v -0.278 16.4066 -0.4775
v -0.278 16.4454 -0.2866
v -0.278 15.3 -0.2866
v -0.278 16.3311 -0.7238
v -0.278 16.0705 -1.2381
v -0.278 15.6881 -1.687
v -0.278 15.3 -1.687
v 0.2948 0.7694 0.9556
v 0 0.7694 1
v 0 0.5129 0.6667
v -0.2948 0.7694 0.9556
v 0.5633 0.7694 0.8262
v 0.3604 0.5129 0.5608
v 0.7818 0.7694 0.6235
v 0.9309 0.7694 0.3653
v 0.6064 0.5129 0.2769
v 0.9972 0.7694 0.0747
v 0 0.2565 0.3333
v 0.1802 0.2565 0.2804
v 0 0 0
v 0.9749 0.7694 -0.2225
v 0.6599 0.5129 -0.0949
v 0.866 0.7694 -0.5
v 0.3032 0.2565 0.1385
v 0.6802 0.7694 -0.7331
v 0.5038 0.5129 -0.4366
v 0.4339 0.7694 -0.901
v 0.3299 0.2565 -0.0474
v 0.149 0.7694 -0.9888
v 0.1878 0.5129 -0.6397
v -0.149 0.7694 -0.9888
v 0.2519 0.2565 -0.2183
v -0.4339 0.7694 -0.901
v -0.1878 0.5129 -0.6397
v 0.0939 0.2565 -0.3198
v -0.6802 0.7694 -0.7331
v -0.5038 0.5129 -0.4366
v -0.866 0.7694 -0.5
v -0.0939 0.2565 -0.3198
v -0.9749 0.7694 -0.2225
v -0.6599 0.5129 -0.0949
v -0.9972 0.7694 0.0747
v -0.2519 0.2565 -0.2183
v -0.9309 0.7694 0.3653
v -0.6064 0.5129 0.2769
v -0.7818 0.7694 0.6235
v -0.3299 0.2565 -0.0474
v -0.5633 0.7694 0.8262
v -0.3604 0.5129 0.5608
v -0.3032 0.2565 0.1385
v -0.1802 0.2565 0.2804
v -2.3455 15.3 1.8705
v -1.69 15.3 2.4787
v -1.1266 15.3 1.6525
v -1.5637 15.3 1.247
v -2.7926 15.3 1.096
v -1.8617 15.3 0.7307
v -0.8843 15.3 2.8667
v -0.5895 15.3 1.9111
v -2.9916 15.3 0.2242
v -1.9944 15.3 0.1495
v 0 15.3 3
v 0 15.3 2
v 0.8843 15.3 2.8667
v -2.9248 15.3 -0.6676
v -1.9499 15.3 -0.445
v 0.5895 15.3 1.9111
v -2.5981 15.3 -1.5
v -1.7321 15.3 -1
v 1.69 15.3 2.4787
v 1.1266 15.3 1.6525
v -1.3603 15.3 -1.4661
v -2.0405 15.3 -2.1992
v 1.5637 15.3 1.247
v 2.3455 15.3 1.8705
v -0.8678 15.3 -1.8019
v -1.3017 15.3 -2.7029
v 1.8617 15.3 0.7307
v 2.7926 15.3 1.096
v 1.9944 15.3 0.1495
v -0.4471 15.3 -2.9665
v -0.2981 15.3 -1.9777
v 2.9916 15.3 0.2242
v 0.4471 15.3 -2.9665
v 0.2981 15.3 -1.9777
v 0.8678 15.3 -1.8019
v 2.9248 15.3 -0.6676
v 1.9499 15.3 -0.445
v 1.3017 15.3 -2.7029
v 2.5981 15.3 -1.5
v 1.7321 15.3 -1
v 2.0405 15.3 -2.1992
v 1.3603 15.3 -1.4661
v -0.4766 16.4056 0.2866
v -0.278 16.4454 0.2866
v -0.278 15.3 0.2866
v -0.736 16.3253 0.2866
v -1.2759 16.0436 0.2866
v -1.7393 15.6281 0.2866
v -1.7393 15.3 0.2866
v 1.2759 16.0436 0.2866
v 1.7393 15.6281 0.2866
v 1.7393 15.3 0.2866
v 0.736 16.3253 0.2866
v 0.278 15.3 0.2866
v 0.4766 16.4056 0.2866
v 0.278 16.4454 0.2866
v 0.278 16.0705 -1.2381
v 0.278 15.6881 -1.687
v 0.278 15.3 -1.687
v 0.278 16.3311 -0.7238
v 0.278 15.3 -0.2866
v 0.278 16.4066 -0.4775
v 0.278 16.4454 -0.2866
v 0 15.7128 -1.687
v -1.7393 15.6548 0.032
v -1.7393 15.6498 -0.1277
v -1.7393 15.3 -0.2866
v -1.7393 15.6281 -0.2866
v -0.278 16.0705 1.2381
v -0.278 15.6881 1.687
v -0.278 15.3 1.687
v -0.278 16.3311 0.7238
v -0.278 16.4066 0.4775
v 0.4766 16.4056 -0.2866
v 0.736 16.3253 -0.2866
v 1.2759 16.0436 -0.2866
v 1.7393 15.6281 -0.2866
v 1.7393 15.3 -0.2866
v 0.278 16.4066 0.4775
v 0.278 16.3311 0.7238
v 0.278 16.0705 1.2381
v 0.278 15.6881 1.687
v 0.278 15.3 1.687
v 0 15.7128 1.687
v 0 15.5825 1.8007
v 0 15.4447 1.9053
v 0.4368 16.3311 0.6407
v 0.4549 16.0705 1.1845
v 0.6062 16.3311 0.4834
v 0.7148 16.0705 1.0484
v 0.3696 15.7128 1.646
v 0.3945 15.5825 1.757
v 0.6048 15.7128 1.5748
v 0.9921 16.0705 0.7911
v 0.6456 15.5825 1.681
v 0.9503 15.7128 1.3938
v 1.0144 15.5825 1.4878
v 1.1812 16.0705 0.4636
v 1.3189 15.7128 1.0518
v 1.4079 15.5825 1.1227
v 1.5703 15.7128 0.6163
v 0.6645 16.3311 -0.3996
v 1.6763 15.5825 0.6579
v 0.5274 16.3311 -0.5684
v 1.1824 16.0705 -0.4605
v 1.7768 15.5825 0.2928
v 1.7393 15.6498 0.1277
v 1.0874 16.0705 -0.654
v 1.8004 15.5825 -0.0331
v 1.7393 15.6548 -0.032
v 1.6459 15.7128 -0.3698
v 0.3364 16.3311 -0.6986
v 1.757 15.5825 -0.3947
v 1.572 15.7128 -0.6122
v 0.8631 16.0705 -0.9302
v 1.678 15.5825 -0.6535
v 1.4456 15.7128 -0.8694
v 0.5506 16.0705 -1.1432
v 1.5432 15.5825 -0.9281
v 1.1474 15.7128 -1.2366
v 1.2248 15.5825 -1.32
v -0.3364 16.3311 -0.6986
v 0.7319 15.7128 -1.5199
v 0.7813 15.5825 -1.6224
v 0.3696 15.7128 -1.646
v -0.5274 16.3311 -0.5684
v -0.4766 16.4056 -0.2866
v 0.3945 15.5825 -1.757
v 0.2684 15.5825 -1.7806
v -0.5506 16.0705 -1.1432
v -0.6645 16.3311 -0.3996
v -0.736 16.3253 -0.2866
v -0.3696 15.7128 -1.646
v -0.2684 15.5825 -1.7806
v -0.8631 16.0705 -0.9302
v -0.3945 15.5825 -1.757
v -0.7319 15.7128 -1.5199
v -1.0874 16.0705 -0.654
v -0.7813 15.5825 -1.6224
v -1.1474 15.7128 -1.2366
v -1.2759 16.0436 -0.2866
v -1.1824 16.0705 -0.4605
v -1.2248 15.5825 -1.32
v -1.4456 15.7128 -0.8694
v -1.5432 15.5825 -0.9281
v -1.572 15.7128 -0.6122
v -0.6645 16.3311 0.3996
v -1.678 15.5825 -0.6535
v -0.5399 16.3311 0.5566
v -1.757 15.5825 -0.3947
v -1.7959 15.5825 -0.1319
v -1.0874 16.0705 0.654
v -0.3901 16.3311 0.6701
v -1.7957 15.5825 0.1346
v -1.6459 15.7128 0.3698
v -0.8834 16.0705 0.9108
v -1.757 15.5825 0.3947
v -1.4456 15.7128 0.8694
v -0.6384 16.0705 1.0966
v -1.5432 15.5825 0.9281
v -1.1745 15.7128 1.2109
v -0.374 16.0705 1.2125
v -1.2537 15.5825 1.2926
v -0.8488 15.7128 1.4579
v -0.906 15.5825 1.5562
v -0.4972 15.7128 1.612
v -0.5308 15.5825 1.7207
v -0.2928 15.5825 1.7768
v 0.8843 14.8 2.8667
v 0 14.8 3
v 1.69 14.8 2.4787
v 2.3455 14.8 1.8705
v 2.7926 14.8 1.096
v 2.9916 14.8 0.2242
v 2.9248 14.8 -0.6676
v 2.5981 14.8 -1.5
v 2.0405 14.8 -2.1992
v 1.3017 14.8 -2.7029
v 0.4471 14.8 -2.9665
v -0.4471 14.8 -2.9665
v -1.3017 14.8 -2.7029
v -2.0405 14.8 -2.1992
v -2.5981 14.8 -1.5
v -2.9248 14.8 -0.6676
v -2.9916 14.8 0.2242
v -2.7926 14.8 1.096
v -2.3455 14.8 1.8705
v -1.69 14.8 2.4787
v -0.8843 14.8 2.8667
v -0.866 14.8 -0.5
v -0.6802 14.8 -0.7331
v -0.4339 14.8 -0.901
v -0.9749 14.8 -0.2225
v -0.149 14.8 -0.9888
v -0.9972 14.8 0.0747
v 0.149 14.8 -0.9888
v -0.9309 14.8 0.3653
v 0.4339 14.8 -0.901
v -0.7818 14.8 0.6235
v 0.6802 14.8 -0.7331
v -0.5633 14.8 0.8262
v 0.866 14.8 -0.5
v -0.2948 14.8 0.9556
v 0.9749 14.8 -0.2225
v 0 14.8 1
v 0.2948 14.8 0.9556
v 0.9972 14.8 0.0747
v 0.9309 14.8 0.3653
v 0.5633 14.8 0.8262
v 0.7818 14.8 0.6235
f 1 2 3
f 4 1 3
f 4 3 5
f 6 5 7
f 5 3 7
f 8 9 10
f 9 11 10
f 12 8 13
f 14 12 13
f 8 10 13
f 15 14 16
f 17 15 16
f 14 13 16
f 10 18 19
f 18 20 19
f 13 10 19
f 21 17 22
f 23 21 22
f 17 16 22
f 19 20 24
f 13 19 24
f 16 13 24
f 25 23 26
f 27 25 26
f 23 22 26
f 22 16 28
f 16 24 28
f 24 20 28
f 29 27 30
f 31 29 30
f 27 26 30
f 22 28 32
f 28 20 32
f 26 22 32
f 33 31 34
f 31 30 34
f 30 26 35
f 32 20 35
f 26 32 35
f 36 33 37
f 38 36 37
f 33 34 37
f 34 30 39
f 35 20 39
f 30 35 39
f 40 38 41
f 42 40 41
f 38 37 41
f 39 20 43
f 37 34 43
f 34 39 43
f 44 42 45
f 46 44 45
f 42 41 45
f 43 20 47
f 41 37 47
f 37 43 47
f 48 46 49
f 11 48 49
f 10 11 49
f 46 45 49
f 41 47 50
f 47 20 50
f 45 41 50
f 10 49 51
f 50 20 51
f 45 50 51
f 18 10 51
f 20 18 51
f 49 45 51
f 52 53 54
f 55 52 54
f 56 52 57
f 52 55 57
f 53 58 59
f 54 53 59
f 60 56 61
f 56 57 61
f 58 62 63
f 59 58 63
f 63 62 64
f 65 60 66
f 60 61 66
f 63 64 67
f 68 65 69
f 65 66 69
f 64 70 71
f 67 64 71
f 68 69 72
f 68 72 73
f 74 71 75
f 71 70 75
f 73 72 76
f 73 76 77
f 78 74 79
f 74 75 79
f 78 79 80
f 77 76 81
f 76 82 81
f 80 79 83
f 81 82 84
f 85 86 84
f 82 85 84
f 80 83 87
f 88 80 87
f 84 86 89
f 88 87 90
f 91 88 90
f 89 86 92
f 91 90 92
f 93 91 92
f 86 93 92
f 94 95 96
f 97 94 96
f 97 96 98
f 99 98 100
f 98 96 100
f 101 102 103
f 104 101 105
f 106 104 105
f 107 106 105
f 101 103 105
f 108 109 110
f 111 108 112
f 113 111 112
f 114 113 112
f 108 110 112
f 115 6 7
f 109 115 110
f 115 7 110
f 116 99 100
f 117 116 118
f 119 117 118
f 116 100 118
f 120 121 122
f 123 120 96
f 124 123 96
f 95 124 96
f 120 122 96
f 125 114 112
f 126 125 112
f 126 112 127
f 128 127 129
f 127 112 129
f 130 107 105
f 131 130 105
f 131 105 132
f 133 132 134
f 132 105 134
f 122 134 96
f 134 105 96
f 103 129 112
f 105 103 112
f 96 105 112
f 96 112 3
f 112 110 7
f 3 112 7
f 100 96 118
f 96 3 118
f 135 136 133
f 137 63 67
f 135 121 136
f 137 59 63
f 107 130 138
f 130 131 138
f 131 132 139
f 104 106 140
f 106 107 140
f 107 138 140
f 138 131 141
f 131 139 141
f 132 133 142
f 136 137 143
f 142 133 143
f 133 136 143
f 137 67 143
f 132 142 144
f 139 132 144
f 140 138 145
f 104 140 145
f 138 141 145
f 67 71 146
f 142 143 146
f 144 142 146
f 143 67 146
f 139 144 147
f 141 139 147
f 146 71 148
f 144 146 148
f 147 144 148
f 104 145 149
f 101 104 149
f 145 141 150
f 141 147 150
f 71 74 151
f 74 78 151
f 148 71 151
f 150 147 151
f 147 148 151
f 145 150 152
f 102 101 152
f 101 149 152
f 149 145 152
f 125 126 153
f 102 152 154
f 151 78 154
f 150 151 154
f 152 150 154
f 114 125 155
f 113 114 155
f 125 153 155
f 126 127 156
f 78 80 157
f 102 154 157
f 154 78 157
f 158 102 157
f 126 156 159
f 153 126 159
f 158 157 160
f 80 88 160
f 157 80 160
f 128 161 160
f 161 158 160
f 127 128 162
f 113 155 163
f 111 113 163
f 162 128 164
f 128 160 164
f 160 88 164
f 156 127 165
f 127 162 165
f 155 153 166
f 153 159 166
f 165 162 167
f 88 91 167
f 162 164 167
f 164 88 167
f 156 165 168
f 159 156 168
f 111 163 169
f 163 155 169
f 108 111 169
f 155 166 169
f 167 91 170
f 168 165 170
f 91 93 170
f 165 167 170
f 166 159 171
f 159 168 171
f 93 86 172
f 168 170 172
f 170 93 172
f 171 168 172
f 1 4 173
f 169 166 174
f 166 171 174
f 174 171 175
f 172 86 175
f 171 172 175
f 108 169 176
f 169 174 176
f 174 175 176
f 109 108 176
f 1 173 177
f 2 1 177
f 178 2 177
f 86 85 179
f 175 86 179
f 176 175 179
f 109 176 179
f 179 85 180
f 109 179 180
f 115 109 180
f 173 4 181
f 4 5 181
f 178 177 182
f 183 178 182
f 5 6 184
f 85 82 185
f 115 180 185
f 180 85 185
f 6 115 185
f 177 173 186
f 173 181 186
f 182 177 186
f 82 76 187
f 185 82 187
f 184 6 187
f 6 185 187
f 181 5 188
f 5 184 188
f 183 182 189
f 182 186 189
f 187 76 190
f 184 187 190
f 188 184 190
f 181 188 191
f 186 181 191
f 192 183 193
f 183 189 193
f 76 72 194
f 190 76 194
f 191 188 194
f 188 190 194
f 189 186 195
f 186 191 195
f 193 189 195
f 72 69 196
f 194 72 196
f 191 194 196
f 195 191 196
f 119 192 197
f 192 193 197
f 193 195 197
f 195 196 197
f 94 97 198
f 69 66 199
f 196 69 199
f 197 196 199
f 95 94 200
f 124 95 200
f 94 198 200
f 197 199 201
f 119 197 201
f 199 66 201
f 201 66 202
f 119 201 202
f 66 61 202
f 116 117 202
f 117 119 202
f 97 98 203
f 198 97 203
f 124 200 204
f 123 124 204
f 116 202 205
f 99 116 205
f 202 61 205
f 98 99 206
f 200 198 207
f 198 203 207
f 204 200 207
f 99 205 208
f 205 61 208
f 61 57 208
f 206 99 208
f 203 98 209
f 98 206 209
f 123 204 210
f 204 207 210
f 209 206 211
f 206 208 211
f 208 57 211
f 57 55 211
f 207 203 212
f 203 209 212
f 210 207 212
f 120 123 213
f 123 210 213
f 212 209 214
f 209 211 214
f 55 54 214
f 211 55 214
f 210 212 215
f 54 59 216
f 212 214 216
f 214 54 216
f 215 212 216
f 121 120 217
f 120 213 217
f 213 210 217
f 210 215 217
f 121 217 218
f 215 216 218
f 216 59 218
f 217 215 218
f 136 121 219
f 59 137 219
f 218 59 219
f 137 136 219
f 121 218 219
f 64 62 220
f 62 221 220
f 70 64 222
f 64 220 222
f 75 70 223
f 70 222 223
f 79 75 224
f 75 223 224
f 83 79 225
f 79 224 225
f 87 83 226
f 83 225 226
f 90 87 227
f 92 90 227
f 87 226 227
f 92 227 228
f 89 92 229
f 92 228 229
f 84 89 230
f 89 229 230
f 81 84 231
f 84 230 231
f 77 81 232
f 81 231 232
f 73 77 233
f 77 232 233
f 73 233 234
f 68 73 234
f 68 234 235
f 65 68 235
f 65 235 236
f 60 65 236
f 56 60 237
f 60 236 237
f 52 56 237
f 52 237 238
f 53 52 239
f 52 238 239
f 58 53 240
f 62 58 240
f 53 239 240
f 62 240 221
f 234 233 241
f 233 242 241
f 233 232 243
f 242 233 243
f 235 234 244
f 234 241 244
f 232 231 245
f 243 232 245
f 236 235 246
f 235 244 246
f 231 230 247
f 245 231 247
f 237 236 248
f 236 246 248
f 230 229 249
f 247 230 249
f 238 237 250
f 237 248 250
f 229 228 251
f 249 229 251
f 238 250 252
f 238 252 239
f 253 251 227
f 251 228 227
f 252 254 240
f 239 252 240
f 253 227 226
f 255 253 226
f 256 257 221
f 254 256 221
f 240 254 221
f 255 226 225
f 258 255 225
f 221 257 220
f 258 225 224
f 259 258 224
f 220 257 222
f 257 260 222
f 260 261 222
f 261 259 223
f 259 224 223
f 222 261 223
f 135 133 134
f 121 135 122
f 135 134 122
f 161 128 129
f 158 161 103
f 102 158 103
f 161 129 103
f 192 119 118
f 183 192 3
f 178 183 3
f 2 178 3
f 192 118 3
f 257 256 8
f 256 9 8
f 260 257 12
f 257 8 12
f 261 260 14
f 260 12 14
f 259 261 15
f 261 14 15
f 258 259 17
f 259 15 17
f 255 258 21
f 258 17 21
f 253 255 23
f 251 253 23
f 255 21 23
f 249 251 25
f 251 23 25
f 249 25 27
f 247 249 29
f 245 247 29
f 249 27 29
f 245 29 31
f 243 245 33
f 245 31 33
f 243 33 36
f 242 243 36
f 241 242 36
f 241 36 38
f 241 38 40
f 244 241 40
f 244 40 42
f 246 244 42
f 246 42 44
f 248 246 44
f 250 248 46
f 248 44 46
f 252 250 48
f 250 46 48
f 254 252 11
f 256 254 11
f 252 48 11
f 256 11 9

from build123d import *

# Parameters (mm, degrees)
CUT_EXTRUDE1_DEPTH = 10


with BuildPart() as part:
    # Sketch1 → Revolve1 (revolve)
    with BuildSketch(Plane(origin=(0, 0, 0), x_dir=(0, 0, -1), z_dir=(1, 0, 0))):
        with BuildLine():
            Line((0, 0), (0, 16.5))
            ThreePointArc((0, 16.5), (-1.148517206, 16.147528677), (-2, 15.3))
            Line((-2, 15.3), (-3, 15.3))
            Line((-3, 15.3), (-3, 14.8))
            Line((-3, 14.8), (-1, 14.8))
            Line((-1, 14.8), (-1, 0.769364806))
            Line((-1, 0.769364806), (0, 0))
        make_face()
    revolve(axis=Axis((0, 0, 0), (0, 1, 0)))

    # Sketch2 → Cut-Extrude1 (cut)
    with BuildSketch(Plane(origin=(0, 15.3, 0), x_dir=(1, 0, 0), z_dir=(0, 1, 0))):
        Polygon((0.277999407, -1.686950947), (-0.277999407, -1.686950947), (-0.277999407, -0.28662128), (-1.73927004, -0.28662128), (-1.73927004, 0.28662128), (-0.277999407, 0.28662128), (-0.277999407, 1.686950947), (0.277999407, 1.686950947), (0.277999407, 0.28662128), (1.73927004, 0.28662128), (1.73927004, -0.28662128), (0.277999407, -0.28662128), align=None)
    extrude(amount=CUT_EXTRUDE1_DEPTH, mode=Mode.SUBTRACT)


solid = part.part
